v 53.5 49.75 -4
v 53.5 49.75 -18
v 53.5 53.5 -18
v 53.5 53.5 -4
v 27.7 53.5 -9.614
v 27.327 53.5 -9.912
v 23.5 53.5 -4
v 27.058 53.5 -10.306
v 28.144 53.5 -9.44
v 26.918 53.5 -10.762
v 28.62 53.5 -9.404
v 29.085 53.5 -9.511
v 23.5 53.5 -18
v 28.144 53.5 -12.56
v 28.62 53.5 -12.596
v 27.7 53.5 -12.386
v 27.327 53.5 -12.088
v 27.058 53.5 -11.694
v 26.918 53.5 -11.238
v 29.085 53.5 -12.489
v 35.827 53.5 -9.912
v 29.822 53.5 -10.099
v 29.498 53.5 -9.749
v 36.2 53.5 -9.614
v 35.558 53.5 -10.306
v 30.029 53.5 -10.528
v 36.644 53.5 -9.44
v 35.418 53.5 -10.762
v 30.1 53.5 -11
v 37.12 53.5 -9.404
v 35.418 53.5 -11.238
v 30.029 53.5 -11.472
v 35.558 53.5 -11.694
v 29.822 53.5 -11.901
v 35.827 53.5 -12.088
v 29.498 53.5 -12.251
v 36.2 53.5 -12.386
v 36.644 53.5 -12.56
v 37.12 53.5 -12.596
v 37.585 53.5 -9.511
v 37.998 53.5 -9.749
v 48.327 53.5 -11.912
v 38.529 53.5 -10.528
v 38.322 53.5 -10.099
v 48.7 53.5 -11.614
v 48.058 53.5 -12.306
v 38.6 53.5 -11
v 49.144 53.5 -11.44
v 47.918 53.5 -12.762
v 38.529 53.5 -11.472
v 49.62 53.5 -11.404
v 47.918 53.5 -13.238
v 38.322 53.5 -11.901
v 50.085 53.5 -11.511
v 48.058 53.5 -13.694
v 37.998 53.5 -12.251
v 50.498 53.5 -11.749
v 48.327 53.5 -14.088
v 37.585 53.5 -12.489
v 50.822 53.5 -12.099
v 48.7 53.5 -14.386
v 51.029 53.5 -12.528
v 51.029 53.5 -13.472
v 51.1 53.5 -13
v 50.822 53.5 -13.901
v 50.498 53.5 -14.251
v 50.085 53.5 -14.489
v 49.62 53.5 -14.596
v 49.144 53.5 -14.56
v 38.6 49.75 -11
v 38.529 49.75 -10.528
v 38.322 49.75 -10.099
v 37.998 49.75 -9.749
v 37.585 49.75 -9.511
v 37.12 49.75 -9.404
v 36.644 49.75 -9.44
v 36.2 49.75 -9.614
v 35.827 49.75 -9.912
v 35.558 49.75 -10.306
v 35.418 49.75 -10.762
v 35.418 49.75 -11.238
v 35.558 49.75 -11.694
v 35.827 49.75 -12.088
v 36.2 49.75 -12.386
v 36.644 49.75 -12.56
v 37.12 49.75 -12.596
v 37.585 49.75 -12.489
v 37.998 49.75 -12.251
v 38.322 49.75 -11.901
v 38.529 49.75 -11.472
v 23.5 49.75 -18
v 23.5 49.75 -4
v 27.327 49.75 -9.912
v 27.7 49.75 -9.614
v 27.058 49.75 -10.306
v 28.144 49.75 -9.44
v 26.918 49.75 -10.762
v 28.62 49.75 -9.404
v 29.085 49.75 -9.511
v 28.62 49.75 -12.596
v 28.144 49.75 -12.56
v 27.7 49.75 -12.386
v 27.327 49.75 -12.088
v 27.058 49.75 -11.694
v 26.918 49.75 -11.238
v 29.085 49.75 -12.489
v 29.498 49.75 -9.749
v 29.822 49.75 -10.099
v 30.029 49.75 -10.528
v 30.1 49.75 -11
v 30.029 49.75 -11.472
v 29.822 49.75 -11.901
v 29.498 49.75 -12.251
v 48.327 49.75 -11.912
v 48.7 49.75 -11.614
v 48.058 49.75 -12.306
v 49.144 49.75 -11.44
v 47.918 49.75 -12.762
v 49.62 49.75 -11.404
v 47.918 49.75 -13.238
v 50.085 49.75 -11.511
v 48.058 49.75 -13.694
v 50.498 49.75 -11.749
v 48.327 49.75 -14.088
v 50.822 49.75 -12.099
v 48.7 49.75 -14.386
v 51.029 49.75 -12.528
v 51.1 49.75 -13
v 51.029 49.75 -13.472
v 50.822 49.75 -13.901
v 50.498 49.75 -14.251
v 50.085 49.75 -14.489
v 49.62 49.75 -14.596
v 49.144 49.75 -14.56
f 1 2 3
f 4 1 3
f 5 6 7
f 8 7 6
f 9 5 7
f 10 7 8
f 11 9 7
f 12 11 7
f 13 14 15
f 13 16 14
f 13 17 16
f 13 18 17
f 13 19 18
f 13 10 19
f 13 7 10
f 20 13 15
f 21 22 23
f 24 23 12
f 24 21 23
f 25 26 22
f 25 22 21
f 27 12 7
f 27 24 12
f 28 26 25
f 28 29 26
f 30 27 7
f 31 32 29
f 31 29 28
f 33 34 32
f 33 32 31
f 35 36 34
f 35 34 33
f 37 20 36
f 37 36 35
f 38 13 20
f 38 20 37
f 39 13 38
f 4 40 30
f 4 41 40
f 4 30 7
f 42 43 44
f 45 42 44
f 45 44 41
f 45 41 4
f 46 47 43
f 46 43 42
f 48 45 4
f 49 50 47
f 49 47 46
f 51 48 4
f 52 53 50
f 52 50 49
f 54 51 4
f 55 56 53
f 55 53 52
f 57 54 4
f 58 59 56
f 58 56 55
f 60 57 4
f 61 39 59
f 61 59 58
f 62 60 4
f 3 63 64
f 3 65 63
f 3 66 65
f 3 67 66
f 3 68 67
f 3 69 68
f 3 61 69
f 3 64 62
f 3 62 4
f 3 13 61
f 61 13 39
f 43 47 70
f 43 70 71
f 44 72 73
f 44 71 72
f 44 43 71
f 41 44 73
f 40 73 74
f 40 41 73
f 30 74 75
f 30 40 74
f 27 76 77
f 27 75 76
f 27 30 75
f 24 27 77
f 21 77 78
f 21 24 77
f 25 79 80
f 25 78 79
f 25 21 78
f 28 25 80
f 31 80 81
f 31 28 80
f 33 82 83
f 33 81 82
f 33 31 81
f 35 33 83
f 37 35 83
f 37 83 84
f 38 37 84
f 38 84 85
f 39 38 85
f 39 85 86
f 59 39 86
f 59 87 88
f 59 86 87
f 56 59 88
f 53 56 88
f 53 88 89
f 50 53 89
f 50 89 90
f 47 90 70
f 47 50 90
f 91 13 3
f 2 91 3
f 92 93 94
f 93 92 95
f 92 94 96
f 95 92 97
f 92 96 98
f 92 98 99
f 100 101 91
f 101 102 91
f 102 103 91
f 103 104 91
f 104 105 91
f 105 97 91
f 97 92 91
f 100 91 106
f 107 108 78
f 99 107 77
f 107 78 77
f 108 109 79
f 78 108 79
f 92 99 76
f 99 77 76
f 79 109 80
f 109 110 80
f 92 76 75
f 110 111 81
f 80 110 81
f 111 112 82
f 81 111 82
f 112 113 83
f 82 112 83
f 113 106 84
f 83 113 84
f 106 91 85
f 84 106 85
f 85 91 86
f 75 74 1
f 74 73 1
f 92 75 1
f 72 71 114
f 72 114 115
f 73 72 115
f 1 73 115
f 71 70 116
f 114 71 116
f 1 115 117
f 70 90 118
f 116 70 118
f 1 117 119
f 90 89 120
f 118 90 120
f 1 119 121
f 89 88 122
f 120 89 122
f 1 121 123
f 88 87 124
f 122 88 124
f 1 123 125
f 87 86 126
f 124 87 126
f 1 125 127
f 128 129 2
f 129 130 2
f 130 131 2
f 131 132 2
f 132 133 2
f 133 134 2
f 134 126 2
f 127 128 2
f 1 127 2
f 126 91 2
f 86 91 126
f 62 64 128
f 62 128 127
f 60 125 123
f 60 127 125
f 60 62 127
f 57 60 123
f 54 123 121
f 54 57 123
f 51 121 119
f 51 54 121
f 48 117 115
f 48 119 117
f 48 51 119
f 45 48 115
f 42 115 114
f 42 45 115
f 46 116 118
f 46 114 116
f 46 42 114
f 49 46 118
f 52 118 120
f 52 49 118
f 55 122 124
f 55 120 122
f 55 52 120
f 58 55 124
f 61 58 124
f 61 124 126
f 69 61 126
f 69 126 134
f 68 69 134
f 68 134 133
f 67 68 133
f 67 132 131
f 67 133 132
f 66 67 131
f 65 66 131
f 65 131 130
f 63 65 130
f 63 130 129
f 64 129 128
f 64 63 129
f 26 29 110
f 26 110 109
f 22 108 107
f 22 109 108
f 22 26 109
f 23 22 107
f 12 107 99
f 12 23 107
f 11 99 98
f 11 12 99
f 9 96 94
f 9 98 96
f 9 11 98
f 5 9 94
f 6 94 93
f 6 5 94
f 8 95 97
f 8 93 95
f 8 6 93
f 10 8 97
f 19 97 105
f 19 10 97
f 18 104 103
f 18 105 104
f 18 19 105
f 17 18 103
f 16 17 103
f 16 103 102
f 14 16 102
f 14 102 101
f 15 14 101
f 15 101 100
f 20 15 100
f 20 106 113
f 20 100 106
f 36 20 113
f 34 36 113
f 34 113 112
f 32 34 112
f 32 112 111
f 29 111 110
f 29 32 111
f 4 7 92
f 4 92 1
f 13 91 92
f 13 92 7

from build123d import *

# Parameters (mm, degrees)
CYLINDER875_R          = 1.6
CYLINDER875_DEPTH      = 20
CYLINDER875_ROLL_ANGLE = 90
CYLINDER876_R          = 1.6
CYLINDER876_DEPTH      = 20
CYLINDER876_ROLL_ANGLE = 90
CYLINDER874_R          = 1.6
CYLINDER874_DEPTH      = 20
CYLINDER874_ROLL_ANGLE = 90
BOX544_W               = 30
BOX544_H               = 3.75
BOX544_DEPTH           = 14


with BuildPart() as cylinder1036:
    # Cylinder875 → Cylinder875 (new body)
    with BuildSketch(Plane.XY):
        Circle(CYLINDER875_R)
    extrude(amount=CYLINDER875_DEPTH)


with BuildPart() as cylinder1036_1:
    # Cylinder875 roll: moved
    add(cylinder1036.part.rotate(Axis((0, 0, 0), (1, 0, 0)), CYLINDER875_ROLL_ANGLE))


with BuildPart() as cylinder1036_2:
    # Cylinder875 placement: moved
    add(cylinder1036_1.part.moved(Location((49.5, 56.5, -13))))


with BuildPart() as cylinder1037:
    # Cylinder876 → Cylinder876 (new body)
    with BuildSketch(Plane.XY):
        Circle(CYLINDER876_R)
    extrude(amount=CYLINDER876_DEPTH)


with BuildPart() as cylinder1037_1:
    # Cylinder876 roll: moved
    add(cylinder1037.part.rotate(Axis((0, 0, 0), (1, 0, 0)), CYLINDER876_ROLL_ANGLE))


with BuildPart() as cylinder1037_2:
    # Cylinder876 placement: moved
    add(cylinder1037_1.part.moved(Location((37, 56.5, -11))))


with BuildPart() as fusion562:
    # Cylinder874 → Cylinder874 (new body)
    with BuildSketch(Plane.XY):
        Circle(CYLINDER874_R)
    extrude(amount=CYLINDER874_DEPTH)


with BuildPart() as fusion562_1:
    # Cylinder874 roll: moved
    add(fusion562.part.rotate(Axis((0, 0, 0), (1, 0, 0)), CYLINDER874_ROLL_ANGLE))


with BuildPart() as fusion562_2:
    # Cylinder874 placement: moved
    add(fusion562_1.part.moved(Location((28.5, 56.5, -11))))

    # Fusion562: union Cylinder1036, Cylinder1037
    add(cylinder1036_2.part)
    add(cylinder1037_2.part)


with BuildPart() as leafspring_mount_front_left_holes:
    # Box544 → Box544 (new body)
    with BuildSketch(Plane(origin=(23.5, 49.75, -18), x_dir=(1, 0, 0), z_dir=(0, 0, 1))):
        with Locations((15, 1.875)):
            Rectangle(BOX544_W, BOX544_H)
    extrude(amount=BOX544_DEPTH)

    # Cut668: cut Fusion562
    add(fusion562_2.part, mode=Mode.SUBTRACT)


solid = leafspring_mount_front_left_holes.part
